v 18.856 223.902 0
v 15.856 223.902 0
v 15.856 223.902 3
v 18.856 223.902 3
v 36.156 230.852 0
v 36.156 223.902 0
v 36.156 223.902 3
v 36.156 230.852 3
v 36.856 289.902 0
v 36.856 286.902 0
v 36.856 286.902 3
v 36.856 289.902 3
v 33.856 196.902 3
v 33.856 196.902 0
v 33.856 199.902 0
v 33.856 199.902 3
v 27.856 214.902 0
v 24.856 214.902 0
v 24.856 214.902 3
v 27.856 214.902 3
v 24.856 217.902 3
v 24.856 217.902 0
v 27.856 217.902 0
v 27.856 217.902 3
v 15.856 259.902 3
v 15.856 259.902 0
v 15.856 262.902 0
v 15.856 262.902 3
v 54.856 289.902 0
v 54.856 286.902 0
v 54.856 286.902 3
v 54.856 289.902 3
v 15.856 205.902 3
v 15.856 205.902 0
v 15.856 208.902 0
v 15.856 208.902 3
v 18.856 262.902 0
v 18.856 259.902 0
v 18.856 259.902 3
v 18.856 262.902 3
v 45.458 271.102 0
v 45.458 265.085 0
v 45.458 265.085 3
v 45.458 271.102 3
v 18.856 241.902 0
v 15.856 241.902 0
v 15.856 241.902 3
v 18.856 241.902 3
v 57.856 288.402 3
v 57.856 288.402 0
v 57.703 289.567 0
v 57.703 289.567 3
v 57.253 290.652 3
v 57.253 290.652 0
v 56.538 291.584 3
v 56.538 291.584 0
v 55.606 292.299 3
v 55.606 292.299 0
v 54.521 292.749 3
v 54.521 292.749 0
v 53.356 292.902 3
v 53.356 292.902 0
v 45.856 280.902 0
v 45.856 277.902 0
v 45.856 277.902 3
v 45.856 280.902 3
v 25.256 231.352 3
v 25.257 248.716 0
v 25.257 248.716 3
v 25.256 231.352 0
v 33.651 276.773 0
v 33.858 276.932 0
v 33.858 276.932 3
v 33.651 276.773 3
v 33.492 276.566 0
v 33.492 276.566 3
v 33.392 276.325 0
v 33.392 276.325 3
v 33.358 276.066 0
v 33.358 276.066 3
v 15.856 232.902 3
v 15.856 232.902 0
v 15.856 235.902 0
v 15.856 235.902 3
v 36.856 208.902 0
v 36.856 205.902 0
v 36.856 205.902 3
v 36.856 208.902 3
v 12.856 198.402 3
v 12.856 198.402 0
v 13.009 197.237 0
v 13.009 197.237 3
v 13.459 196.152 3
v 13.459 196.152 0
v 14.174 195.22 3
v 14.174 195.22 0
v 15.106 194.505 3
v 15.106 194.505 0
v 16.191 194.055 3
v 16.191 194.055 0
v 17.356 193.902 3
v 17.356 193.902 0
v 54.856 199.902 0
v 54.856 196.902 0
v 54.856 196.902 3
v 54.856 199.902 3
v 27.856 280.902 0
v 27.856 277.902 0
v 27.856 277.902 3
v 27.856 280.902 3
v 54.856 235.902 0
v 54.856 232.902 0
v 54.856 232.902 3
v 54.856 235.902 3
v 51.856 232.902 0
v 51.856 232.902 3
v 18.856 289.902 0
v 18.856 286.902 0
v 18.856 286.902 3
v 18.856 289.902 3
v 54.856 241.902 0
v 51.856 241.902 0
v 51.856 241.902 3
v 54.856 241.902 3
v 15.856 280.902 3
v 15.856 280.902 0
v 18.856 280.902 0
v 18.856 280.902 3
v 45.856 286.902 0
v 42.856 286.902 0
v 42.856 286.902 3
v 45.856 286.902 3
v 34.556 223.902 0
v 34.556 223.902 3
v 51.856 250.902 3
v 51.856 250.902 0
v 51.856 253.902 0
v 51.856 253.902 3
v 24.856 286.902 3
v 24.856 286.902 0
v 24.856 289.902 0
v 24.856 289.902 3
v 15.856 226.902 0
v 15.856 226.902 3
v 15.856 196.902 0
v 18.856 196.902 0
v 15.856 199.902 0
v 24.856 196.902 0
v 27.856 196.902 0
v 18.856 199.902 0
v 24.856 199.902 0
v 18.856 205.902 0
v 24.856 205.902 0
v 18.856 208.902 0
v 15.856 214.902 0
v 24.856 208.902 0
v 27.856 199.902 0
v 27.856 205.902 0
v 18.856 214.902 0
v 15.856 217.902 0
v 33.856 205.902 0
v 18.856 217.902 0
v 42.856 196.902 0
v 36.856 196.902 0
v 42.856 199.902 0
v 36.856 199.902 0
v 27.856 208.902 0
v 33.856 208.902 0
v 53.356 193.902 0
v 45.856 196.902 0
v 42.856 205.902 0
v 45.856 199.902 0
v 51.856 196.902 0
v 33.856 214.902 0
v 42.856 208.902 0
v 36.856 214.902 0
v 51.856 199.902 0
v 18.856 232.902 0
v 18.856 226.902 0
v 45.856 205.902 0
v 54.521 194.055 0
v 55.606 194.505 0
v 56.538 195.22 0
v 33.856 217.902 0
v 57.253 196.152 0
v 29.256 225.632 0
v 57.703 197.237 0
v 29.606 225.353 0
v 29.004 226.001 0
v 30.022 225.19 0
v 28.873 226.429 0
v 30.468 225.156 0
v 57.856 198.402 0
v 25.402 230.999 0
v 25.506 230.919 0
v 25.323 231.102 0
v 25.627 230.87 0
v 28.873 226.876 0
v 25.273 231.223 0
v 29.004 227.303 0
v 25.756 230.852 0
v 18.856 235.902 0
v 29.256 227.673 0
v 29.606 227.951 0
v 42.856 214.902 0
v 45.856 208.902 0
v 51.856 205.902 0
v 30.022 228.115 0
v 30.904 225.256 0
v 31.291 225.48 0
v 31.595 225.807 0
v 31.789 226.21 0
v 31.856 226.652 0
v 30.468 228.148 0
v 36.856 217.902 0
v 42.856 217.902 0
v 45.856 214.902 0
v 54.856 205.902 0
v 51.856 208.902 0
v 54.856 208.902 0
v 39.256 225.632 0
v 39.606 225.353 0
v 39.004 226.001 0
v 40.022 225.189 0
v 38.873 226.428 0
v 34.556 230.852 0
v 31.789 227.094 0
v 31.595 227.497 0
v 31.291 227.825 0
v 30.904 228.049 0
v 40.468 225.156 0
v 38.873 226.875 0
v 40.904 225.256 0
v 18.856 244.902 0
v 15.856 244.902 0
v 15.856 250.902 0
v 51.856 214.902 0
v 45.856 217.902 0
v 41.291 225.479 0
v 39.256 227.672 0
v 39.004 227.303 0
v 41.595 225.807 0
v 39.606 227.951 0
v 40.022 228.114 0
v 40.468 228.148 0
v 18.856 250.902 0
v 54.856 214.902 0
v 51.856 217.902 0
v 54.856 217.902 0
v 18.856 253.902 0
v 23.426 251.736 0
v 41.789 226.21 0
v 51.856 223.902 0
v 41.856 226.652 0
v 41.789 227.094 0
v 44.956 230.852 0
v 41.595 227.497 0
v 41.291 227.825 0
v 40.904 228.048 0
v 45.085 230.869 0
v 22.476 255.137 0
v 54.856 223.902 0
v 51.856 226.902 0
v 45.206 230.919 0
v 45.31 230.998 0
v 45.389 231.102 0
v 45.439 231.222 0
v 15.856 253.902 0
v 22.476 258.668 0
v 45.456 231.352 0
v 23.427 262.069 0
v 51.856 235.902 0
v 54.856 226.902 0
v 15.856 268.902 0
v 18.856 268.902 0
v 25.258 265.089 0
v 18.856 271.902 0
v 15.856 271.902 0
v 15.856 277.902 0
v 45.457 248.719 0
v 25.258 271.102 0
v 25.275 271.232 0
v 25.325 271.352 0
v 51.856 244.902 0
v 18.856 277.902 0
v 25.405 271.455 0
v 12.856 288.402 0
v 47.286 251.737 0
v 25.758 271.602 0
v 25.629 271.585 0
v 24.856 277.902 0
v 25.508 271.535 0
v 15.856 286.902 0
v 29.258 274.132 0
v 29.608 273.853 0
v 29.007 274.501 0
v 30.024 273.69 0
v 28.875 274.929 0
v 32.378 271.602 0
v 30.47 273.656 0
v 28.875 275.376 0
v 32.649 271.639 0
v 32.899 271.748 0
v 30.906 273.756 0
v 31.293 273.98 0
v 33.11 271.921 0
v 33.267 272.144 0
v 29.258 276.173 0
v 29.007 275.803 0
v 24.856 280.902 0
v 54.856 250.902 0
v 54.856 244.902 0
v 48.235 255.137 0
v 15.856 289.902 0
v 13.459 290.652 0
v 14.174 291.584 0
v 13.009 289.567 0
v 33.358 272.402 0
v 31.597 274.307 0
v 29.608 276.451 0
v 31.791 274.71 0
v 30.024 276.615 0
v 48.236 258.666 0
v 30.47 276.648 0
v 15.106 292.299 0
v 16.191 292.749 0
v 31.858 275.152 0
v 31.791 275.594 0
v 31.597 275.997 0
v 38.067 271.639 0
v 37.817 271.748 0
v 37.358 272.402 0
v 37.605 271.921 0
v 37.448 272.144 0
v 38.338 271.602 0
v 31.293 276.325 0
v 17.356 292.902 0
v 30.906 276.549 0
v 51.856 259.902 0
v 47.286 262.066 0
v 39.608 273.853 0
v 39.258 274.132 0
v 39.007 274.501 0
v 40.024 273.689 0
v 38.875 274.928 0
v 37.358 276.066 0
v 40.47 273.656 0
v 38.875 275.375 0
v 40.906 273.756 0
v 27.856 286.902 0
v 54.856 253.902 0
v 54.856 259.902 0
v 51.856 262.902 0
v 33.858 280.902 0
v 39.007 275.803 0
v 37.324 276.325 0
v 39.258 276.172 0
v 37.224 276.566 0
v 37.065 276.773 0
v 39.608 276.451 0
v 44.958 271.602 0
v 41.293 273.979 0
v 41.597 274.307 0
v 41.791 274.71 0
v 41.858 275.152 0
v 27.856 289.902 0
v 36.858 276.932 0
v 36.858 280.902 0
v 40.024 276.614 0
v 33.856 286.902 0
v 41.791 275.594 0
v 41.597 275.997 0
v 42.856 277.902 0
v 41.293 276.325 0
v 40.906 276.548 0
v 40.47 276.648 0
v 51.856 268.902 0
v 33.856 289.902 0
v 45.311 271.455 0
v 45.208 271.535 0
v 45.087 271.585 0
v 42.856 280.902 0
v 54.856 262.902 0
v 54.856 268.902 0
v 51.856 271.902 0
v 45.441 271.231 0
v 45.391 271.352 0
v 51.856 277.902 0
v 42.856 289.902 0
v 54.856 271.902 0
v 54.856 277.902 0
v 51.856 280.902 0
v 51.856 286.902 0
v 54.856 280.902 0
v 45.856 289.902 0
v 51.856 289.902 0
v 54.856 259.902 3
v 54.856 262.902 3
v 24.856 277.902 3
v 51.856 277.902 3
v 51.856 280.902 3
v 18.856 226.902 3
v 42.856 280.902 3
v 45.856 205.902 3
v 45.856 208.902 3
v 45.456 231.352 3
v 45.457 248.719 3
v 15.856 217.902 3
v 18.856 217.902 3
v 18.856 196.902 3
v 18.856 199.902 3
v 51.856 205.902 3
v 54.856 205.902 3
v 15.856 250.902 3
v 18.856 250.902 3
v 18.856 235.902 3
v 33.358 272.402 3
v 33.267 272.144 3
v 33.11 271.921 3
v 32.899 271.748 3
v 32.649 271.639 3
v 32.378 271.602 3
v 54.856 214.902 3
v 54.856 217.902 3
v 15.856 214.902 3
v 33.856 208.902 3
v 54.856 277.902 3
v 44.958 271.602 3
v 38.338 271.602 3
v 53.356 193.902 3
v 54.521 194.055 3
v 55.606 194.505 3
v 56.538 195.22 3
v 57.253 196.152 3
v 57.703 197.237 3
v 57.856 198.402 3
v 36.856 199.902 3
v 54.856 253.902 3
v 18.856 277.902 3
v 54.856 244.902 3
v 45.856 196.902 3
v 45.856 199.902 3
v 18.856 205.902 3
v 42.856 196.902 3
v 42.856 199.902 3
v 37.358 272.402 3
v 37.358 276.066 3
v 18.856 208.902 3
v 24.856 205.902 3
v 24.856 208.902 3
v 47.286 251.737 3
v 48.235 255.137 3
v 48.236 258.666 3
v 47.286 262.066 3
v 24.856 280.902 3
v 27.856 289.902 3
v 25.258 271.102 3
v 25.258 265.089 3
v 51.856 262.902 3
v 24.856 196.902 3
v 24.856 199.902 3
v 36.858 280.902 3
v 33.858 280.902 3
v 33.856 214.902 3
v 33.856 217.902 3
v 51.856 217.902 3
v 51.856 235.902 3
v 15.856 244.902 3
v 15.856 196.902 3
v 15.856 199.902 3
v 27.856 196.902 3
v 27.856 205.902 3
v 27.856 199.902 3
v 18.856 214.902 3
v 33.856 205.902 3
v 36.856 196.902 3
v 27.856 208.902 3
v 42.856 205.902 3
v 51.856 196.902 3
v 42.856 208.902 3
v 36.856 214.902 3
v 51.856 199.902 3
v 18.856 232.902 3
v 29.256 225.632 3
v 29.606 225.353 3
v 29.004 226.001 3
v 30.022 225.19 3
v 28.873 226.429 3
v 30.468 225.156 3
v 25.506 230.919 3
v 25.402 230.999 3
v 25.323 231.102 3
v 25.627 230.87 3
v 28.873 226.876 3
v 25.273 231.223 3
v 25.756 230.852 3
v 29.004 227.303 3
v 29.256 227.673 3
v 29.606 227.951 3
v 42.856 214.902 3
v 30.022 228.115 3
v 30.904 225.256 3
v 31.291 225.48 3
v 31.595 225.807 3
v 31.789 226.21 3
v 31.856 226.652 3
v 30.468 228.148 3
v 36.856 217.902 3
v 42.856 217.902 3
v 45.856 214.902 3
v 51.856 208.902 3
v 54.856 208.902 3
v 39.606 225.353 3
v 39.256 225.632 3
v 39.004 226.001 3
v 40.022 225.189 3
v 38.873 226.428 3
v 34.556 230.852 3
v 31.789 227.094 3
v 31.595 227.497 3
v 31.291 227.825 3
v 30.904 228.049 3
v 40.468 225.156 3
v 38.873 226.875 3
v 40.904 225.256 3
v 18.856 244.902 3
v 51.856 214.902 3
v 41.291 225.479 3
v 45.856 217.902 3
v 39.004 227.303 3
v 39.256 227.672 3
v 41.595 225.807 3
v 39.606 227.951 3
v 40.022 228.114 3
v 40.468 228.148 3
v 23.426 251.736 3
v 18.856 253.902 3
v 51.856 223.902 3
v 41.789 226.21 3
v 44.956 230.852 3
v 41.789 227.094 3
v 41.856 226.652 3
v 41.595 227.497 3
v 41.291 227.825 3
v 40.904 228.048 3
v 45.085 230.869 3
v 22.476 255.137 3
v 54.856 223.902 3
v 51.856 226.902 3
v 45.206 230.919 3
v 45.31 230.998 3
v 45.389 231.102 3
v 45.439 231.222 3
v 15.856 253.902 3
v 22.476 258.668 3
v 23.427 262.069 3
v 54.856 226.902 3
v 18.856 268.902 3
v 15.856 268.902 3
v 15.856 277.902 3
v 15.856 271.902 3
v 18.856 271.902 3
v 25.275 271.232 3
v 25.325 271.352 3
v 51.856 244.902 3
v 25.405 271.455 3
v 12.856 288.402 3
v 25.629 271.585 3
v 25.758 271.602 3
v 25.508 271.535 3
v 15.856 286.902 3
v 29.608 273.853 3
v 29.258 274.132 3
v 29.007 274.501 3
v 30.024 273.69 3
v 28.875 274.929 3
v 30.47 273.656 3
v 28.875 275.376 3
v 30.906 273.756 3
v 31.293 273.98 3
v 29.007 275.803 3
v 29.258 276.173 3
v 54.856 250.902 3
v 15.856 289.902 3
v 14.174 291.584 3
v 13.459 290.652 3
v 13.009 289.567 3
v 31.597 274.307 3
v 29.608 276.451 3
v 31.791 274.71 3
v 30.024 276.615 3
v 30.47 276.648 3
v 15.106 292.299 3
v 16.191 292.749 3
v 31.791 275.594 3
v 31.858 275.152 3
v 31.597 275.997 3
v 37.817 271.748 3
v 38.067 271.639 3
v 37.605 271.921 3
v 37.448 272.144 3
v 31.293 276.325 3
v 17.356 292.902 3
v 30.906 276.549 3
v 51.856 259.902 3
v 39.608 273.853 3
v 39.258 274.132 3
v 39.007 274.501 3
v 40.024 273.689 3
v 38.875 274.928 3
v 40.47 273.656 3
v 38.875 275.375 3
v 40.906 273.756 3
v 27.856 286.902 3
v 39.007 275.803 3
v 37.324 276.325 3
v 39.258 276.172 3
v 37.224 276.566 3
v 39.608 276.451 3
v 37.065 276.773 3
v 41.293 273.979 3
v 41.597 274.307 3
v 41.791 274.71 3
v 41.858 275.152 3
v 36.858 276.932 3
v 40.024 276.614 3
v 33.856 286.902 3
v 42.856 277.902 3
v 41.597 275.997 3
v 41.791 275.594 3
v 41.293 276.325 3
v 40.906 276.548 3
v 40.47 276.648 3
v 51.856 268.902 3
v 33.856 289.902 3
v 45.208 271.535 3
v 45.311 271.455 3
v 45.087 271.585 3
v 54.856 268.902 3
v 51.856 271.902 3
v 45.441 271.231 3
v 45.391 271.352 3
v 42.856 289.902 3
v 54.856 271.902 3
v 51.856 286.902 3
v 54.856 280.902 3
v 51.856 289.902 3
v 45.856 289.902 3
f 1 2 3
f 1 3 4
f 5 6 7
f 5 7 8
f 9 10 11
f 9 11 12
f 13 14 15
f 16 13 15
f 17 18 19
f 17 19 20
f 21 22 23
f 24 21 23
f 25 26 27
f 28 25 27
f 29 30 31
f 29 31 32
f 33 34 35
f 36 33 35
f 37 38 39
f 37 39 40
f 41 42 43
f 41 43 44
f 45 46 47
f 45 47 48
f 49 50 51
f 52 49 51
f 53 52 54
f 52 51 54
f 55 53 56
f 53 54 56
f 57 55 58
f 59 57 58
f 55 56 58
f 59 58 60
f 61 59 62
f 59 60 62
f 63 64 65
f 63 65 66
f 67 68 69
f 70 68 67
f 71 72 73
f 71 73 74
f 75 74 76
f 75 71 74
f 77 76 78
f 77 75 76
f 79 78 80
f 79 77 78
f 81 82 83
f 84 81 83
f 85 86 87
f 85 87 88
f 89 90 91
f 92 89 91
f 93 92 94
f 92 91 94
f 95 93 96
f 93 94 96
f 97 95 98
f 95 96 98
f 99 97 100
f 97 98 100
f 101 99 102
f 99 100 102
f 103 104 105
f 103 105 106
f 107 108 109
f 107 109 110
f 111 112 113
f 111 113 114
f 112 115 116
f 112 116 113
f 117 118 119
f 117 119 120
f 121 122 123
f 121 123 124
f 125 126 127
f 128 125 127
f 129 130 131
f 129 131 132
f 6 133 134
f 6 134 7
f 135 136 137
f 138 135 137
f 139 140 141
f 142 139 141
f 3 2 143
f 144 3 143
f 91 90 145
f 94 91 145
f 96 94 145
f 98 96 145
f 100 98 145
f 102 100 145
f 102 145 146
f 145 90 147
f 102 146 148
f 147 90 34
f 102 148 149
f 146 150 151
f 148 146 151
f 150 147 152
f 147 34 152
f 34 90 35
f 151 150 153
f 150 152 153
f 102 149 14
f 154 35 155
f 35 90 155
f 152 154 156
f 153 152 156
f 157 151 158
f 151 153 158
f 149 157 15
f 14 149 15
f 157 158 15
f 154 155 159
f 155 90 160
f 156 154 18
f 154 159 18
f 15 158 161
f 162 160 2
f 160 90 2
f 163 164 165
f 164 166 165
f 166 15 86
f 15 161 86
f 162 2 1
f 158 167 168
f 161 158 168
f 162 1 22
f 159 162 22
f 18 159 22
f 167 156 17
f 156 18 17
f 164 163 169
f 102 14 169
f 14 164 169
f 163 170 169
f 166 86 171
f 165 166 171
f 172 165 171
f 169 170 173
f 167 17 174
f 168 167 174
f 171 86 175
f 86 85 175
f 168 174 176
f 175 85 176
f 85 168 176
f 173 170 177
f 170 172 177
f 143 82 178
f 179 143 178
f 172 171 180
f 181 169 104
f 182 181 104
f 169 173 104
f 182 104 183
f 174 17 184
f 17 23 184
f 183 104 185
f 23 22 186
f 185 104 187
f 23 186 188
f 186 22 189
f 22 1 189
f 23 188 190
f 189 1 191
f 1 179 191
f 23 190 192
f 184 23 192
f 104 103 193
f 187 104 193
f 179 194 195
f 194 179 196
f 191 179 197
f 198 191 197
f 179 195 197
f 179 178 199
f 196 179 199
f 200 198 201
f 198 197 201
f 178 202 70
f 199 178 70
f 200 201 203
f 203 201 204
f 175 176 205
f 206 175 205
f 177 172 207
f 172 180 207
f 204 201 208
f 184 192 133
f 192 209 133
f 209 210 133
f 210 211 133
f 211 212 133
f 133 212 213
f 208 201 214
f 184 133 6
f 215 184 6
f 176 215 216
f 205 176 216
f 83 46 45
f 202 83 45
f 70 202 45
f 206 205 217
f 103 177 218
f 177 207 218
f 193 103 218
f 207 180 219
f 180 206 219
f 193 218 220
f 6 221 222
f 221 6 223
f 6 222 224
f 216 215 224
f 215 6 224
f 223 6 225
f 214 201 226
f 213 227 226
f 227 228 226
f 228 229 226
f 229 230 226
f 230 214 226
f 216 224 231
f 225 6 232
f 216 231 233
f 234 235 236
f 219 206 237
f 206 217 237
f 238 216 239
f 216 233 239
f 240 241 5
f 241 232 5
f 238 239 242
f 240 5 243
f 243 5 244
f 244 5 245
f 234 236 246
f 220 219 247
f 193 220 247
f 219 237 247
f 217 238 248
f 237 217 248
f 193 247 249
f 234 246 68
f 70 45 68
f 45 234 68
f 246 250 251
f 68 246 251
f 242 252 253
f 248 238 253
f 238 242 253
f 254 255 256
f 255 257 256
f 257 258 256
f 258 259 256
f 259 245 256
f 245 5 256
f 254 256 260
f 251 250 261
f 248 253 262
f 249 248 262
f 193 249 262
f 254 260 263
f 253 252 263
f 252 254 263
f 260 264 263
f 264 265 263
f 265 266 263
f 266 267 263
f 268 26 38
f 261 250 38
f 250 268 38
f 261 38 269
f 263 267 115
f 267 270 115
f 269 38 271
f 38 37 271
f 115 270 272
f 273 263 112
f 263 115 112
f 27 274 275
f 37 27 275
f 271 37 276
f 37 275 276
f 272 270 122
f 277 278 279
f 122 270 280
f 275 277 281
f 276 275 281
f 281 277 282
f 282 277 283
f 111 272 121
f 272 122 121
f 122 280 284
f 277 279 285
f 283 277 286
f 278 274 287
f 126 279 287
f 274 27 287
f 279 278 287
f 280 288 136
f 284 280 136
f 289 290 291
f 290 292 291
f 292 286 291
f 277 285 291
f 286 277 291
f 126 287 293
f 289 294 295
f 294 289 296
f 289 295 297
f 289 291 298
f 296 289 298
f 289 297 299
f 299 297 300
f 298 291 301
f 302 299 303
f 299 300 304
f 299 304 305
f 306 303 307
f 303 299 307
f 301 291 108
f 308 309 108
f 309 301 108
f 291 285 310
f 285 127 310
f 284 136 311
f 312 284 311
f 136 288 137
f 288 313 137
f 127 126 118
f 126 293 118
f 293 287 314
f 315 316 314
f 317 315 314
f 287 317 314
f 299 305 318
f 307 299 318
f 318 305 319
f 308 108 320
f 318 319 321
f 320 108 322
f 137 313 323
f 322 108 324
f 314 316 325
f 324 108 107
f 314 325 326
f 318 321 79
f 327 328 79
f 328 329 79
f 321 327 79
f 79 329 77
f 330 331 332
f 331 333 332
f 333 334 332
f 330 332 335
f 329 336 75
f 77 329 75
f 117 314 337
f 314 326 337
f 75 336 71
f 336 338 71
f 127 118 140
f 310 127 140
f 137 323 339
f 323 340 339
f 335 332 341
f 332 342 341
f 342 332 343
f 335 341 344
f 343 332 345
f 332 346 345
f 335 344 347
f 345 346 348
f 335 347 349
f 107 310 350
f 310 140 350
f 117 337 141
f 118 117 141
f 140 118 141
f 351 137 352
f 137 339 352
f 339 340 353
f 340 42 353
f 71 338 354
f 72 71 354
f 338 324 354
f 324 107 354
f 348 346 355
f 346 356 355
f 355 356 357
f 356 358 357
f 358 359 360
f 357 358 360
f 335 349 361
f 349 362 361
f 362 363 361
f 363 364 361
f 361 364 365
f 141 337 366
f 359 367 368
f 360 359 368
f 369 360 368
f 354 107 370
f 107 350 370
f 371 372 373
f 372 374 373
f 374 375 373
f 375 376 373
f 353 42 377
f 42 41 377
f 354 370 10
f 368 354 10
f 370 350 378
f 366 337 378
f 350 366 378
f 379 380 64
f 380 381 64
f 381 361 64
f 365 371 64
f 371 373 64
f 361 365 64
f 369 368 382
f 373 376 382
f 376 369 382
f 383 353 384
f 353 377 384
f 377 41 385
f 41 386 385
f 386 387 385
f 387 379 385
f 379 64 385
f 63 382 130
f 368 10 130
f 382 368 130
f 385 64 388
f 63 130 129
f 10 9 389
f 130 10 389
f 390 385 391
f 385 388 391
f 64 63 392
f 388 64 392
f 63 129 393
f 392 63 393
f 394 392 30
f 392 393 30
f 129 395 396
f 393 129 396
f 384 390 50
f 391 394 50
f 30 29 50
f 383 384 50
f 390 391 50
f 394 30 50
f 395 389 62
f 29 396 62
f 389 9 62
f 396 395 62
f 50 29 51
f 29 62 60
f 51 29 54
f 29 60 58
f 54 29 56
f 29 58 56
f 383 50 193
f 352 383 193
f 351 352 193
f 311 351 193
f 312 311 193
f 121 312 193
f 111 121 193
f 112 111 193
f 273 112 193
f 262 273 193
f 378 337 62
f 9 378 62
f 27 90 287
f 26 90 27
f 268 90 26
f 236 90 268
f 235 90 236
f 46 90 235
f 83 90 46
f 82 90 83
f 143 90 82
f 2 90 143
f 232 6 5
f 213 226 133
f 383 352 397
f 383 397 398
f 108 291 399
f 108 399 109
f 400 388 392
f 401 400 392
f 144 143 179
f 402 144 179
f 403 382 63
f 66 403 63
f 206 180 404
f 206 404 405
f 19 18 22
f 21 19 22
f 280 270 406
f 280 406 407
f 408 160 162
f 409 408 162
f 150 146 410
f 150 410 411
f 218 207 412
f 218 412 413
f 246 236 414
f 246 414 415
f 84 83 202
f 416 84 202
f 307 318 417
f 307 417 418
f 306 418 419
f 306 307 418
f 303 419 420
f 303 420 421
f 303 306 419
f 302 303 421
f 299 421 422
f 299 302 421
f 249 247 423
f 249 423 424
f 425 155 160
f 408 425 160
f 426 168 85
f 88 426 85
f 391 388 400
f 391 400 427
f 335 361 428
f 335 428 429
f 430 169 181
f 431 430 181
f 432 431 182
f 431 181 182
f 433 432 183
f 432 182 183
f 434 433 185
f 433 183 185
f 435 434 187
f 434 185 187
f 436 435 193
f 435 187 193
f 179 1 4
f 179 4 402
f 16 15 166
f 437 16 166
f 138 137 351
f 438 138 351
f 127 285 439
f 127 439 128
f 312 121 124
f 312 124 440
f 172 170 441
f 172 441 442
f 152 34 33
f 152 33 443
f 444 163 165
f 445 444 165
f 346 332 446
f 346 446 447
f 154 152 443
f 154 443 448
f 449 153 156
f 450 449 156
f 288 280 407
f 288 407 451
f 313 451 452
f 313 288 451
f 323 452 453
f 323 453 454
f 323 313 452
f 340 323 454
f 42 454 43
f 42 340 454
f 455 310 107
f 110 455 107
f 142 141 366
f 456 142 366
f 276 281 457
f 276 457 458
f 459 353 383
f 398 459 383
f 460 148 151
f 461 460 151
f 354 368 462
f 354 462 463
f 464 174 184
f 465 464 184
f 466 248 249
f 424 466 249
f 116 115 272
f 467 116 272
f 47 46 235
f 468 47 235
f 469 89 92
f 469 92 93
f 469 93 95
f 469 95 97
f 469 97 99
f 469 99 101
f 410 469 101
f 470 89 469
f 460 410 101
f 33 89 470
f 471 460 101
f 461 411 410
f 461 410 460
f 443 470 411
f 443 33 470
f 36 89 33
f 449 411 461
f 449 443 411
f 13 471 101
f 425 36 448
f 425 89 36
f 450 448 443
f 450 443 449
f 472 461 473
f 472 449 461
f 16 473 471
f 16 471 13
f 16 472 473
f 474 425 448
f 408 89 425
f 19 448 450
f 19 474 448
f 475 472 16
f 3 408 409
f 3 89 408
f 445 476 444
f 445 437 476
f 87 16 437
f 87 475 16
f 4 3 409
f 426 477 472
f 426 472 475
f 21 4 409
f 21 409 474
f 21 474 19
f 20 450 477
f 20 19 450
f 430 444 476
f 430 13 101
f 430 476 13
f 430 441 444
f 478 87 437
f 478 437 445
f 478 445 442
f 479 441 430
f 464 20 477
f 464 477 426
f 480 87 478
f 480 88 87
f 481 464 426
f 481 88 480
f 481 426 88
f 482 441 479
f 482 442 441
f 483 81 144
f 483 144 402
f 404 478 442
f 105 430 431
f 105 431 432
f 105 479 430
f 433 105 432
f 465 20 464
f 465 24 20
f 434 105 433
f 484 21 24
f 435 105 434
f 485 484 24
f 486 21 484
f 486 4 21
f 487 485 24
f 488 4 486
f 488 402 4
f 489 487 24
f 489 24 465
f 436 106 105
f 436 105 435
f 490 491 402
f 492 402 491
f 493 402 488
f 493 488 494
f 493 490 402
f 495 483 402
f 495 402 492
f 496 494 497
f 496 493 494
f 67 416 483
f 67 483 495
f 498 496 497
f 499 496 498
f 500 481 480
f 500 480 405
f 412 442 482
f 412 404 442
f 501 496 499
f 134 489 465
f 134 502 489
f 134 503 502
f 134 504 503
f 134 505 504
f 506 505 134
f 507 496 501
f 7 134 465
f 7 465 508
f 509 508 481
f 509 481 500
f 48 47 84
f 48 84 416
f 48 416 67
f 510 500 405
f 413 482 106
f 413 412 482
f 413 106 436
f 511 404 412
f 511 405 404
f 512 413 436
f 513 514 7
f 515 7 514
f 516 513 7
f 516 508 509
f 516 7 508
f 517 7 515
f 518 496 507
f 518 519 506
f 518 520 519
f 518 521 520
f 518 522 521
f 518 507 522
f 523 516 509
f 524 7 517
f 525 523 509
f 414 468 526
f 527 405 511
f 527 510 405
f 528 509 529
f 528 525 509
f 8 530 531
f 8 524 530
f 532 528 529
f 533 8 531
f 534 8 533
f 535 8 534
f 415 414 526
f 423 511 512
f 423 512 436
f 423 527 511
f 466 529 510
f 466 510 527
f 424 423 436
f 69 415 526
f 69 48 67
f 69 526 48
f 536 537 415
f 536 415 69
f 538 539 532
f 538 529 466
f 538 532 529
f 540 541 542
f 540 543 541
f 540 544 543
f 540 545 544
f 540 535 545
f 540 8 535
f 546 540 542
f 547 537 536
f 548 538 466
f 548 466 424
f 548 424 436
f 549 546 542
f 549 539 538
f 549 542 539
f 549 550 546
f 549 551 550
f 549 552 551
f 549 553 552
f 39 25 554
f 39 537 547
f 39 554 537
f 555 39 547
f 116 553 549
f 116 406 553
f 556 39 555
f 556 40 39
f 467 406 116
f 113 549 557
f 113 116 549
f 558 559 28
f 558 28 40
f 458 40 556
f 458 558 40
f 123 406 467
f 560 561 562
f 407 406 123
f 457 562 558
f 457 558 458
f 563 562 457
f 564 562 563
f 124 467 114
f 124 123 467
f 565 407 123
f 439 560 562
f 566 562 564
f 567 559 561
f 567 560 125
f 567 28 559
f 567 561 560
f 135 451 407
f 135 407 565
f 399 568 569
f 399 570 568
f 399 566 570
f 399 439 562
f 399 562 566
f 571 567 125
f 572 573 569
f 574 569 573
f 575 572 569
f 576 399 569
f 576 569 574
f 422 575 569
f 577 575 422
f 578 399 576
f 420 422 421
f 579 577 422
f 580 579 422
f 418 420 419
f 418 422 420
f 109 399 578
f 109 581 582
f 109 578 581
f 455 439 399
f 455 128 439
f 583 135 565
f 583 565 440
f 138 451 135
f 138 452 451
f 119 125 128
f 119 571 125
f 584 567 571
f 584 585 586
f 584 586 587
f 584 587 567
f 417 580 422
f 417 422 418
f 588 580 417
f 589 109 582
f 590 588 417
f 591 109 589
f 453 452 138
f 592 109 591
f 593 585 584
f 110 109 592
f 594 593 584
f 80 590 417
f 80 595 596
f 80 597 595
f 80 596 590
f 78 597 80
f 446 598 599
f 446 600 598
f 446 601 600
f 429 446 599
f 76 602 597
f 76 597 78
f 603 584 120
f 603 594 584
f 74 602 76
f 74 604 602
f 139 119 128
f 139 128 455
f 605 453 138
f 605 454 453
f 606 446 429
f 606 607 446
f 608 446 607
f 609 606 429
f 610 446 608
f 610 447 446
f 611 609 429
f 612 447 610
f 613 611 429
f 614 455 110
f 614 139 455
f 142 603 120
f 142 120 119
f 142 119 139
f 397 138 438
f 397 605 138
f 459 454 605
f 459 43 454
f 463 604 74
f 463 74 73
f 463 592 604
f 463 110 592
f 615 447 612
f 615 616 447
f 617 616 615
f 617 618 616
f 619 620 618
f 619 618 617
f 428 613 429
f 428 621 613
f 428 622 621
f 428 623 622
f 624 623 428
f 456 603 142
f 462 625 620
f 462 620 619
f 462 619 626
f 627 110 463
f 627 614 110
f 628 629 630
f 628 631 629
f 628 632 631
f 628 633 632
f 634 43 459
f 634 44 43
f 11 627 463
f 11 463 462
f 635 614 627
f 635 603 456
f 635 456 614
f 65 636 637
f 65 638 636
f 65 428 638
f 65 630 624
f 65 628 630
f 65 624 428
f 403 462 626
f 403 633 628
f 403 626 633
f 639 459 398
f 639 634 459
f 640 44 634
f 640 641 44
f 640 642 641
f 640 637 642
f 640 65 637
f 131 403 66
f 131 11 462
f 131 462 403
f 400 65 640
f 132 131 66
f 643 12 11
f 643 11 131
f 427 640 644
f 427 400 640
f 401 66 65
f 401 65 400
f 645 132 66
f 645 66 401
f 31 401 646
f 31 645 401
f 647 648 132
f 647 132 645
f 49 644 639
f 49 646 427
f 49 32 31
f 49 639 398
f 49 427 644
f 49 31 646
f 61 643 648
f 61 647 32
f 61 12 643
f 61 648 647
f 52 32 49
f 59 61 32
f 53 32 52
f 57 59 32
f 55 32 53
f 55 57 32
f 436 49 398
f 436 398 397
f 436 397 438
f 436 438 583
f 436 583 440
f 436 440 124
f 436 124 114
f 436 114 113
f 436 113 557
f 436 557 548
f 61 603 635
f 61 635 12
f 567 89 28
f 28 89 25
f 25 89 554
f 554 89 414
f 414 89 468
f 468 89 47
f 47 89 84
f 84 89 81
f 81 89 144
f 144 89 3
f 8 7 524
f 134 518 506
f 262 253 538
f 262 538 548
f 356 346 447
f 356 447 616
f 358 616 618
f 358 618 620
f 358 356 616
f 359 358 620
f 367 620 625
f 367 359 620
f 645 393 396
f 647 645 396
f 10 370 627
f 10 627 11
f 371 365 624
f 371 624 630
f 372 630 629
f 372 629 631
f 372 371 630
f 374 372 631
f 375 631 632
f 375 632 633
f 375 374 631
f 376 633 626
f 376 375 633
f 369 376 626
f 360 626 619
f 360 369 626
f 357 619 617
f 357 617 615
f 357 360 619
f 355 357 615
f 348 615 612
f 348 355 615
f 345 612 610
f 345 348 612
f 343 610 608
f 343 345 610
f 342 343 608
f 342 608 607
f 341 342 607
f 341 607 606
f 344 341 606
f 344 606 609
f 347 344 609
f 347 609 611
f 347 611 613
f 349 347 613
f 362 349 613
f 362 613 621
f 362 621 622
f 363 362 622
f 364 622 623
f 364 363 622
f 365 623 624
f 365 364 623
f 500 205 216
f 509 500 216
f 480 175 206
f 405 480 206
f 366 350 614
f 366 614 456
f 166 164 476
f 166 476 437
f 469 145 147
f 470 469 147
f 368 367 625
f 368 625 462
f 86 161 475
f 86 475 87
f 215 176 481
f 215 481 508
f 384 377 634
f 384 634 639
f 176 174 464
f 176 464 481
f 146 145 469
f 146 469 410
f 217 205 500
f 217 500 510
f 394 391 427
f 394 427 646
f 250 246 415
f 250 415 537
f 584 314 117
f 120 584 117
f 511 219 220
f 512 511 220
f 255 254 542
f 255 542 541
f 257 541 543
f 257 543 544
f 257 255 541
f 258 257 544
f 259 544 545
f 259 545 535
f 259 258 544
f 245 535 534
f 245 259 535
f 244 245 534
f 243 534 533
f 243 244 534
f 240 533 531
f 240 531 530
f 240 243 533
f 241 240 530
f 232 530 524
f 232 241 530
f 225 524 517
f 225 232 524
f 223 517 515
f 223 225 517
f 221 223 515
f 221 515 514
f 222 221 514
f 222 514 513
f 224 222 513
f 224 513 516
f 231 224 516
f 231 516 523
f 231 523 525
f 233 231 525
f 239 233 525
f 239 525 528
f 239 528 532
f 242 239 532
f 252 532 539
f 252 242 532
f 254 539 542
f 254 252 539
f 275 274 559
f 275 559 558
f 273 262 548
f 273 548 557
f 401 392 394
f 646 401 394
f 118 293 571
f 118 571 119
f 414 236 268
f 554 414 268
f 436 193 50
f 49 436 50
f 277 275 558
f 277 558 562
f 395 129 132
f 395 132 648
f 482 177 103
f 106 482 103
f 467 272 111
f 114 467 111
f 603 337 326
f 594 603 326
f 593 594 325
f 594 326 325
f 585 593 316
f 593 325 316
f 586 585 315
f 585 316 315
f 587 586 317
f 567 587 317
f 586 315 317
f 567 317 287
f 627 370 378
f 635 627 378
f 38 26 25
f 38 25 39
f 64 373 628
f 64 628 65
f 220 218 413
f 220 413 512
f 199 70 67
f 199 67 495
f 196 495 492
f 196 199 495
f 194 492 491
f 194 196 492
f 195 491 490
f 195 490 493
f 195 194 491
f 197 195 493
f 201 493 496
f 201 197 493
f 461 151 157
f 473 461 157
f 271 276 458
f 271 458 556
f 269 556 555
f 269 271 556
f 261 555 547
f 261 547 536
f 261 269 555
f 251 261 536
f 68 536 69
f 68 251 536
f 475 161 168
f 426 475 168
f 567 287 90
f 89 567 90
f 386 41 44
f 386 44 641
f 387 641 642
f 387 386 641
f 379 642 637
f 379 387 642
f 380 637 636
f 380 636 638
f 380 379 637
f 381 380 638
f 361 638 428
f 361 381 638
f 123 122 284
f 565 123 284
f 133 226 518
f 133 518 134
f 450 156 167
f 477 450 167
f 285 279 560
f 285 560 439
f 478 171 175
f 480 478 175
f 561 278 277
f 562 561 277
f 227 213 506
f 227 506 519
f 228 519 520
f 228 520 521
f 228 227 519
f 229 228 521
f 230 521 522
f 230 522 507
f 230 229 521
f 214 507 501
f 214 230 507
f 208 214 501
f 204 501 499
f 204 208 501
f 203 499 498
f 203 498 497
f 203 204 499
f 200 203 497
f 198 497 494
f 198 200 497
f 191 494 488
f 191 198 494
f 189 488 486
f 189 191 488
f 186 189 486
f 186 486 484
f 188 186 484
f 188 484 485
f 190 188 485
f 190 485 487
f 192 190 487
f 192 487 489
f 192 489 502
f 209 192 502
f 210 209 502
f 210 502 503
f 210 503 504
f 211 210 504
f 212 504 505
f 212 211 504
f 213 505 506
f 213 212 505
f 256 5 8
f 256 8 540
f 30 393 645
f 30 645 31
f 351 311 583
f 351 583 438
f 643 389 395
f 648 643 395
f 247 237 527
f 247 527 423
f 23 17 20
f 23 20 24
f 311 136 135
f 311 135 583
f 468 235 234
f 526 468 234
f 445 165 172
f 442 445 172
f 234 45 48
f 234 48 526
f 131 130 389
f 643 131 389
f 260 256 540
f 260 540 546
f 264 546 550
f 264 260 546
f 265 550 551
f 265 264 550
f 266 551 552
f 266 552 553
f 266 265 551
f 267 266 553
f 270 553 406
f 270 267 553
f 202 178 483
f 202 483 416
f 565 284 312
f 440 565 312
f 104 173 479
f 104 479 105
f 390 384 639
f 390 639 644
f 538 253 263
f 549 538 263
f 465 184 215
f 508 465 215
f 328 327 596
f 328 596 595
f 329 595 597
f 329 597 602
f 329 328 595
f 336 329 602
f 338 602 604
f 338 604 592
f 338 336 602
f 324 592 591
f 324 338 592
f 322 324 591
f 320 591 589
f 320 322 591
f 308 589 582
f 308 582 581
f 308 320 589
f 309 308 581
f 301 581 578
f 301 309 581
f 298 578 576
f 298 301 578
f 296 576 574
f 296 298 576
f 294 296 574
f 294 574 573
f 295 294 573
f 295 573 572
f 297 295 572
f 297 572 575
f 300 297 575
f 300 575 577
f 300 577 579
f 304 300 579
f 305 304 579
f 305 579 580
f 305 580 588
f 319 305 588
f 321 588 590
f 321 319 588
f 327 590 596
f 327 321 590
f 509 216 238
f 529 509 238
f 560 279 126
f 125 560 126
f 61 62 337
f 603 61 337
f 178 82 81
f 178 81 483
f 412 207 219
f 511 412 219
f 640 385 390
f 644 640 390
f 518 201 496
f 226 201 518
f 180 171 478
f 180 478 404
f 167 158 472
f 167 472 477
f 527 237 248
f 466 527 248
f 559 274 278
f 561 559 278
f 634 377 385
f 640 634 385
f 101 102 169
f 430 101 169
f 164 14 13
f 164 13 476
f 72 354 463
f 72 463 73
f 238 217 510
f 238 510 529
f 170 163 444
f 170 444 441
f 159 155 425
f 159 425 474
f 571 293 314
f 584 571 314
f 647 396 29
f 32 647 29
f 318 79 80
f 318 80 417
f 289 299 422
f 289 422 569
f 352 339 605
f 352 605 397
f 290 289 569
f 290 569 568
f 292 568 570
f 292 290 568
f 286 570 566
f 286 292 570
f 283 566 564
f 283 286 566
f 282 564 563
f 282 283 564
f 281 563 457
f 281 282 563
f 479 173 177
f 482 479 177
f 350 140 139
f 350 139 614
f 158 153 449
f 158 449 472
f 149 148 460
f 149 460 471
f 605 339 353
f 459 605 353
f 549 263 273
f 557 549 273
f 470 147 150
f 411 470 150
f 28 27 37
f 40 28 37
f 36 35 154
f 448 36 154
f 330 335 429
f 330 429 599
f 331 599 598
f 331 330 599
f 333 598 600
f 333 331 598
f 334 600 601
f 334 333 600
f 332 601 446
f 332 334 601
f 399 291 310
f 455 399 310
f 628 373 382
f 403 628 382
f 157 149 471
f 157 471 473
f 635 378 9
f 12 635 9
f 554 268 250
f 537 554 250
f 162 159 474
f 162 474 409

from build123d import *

# Parameters (mm, degrees)
MODEL_R                 = 1.5
MODEL_W                 = 3
MODEL_H                 = 3
SALIENTE_EXTRUIR1_DEPTH = 3


with BuildPart() as part:
    # Model → Saliente-Extruir1 (new body)
    with BuildSketch(Plane.XY):
        with BuildLine():
            Line((17.356035274, 193.902048875), (53.356035274, 193.902048875))
            ThreePointArc((53.356035274, 193.902048875), (56.53801579, 195.22006836), (57.856035274, 198.402048875))
            Line((57.856035274, 198.402048875), (57.856035274, 288.402048875))
            ThreePointArc((57.856035274, 288.402048875), (56.53801579, 291.58402939), (53.356035274, 292.902048875))
            Line((53.356035274, 292.902048875), (17.356035274, 292.902048875))
            ThreePointArc((17.356035274, 292.902048875), (14.174054759, 291.58402939), (12.856035274, 288.402048875))
            Line((12.856035274, 288.402048875), (12.856035274, 198.402048875))
            ThreePointArc((12.856035274, 198.402048875), (14.174054759, 195.22006836), (17.356035274, 193.902048875))
        make_face()
        with Locations((40.355847758, 226.651825621)):
            Circle(MODEL_R, mode=Mode.SUBTRACT)
        with Locations((30.355847768, 226.652272077)):
            Circle(MODEL_R, mode=Mode.SUBTRACT)
        with Locations((40.358013069, 275.151825573)):
            Circle(MODEL_R, mode=Mode.SUBTRACT)
        with Locations((30.35801308, 275.152272029)):
            Circle(MODEL_R, mode=Mode.SUBTRACT)
        with Locations((53.356035274, 288.402048875)):
            Rectangle(MODEL_W, MODEL_H, mode=Mode.SUBTRACT)
        with Locations((53.356035274, 279.402048875)):
            Rectangle(MODEL_W, MODEL_H, mode=Mode.SUBTRACT)
        with Locations((53.356035274, 270.402048875)):
            Rectangle(MODEL_W, MODEL_H, mode=Mode.SUBTRACT)
        with Locations((53.356035274, 261.402048875)):
            Rectangle(MODEL_W, MODEL_H, mode=Mode.SUBTRACT)
        with Locations((53.356035274, 252.402048875)):
            Rectangle(MODEL_W, MODEL_H, mode=Mode.SUBTRACT)
        with Locations((53.356035274, 243.402048875)):
            Rectangle(MODEL_W, MODEL_H, mode=Mode.SUBTRACT)
        with Locations((53.356035274, 234.402048875)):
            Rectangle(MODEL_W, MODEL_H, mode=Mode.SUBTRACT)
        with Locations((53.356035274, 225.402048875)):
            Rectangle(MODEL_W, MODEL_H, mode=Mode.SUBTRACT)
        with Locations((53.356035274, 216.402048875)):
            Rectangle(MODEL_W, MODEL_H, mode=Mode.SUBTRACT)
        with Locations((53.356035274, 207.402048875)):
            Rectangle(MODEL_W, MODEL_H, mode=Mode.SUBTRACT)
        with Locations((53.356035274, 198.402048875)):
            Rectangle(MODEL_W, MODEL_H, mode=Mode.SUBTRACT)
        with Locations((17.356035274, 288.402048875)):
            Rectangle(MODEL_W, MODEL_H, mode=Mode.SUBTRACT)
        with Locations((17.356035274, 279.402048875)):
            Rectangle(MODEL_W, MODEL_H, mode=Mode.SUBTRACT)
        with Locations((17.356035274, 270.402048875)):
            Rectangle(MODEL_W, MODEL_H, mode=Mode.SUBTRACT)
        with Locations((17.356035274, 261.402048875)):
            Rectangle(MODEL_W, MODEL_H, mode=Mode.SUBTRACT)
        with Locations((17.356035274, 252.402048875)):
            Rectangle(MODEL_W, MODEL_H, mode=Mode.SUBTRACT)
        with Locations((17.356035274, 243.402048875)):
            Rectangle(MODEL_W, MODEL_H, mode=Mode.SUBTRACT)
        with Locations((17.356035274, 234.402048875)):
            Rectangle(MODEL_W, MODEL_H, mode=Mode.SUBTRACT)
        with Locations((17.356035274, 225.402048875)):
            Rectangle(MODEL_W, MODEL_H, mode=Mode.SUBTRACT)
        with Locations((17.356035274, 216.402048875)):
            Rectangle(MODEL_W, MODEL_H, mode=Mode.SUBTRACT)
        with Locations((17.356035274, 207.402048875)):
            Rectangle(MODEL_W, MODEL_H, mode=Mode.SUBTRACT)
        with Locations((17.356035274, 198.402048875)):
            Rectangle(MODEL_W, MODEL_H, mode=Mode.SUBTRACT)
        with Locations((44.356035274, 198.402048875)):
            Rectangle(MODEL_W, MODEL_H, mode=Mode.SUBTRACT)
        with Locations((26.356035274, 198.402048875)):
            Rectangle(MODEL_W, MODEL_H, mode=Mode.SUBTRACT)
        with Locations((35.356035274, 198.402048875)):
            Rectangle(MODEL_W, MODEL_H, mode=Mode.SUBTRACT)
        with Locations((44.356035274, 216.402048875)):
            Rectangle(MODEL_W, MODEL_H, mode=Mode.SUBTRACT)
        with Locations((26.356035274, 216.402048875)):
            Rectangle(MODEL_W, MODEL_H, mode=Mode.SUBTRACT)
        with Locations((35.356035274, 216.402048875)):
            Rectangle(MODEL_W, MODEL_H, mode=Mode.SUBTRACT)
        with Locations((44.356035274, 207.402048875)):
            Rectangle(MODEL_W, MODEL_H, mode=Mode.SUBTRACT)
        with Locations((26.356035274, 207.402048875)):
            Rectangle(MODEL_W, MODEL_H, mode=Mode.SUBTRACT)
        with Locations((35.356035274, 207.402048875)):
            Rectangle(MODEL_W, MODEL_H, mode=Mode.SUBTRACT)
        with Locations((44.356035274, 288.402048875)):
            Rectangle(MODEL_W, MODEL_H, mode=Mode.SUBTRACT)
        with Locations((26.356035274, 288.402048875)):
            Rectangle(MODEL_W, MODEL_H, mode=Mode.SUBTRACT)
        with Locations((35.356035274, 288.402048875)):
            Rectangle(MODEL_W, MODEL_H, mode=Mode.SUBTRACT)
        with Locations((44.356035274, 279.402048875)):
            Rectangle(MODEL_W, MODEL_H, mode=Mode.SUBTRACT)
        with Locations((26.356035274, 279.402048875)):
            Rectangle(MODEL_W, MODEL_H, mode=Mode.SUBTRACT)
        with BuildLine():
            Line((33.857854573, 280.901620206), (33.857854573, 276.931747225))
            ThreePointArc((33.857854573, 276.931747225), (33.491829169, 276.565721821), (33.357854573, 276.065721821))
            Line((33.357854573, 276.065721821), (33.357854573, 272.401620206))
            ThreePointArc((33.357854573, 272.401620206), (33.010514208, 271.827023537), (32.378058676, 271.601620206))
            Line((32.378058676, 271.601620206), (25.757854573, 271.601620206))
            ThreePointArc((25.757854573, 271.601620206), (25.404597365, 271.455492569), (25.25783227, 271.102499725))
            Line((25.25783227, 271.102499725), (25.25756379, 265.088924432))
            ThreePointArc((25.25756379, 265.088924432), (22.355834382, 256.902629272), (25.256832814, 248.716075046))
            Line((25.256832814, 248.716075046), (25.256057607, 231.352499765))
            ThreePointArc((25.256057607, 231.352499765), (25.402488432, 230.998939836), (25.756035284, 230.852477443))
            Line((25.756035284, 230.852477443), (34.556035275, 230.852084561))
            Line((34.556035275, 230.852084561), (34.555724988, 223.902084568))
            Line((34.555724988, 223.902084568), (36.155724986, 223.902013135))
            Line((36.155724986, 223.902013135), (36.156035273, 230.852013128))
            Line((36.156035273, 230.852013128), (44.956035265, 230.851620247))
            ThreePointArc((44.956035265, 230.851620247), (45.309595193, 230.998051072), (45.456057587, 231.351597924))
            Line((45.456057587, 231.351597924), (45.456832945, 248.718539377))
            ThreePointArc((45.456832945, 248.718539377), (48.355834356, 256.901468487), (45.45756362, 265.084656419))
            Line((45.45756362, 265.084656419), (45.45783225, 271.101597884))
            ThreePointArc((45.45783225, 271.101597884), (45.311401425, 271.455157812), (44.957854573, 271.601620206))
            Line((44.957854573, 271.601620206), (38.33765047, 271.601620206))
            ThreePointArc((38.33765047, 271.601620206), (37.705194938, 271.827023537), (37.357854573, 272.401620206))
            Line((37.357854573, 272.401620206), (37.357854573, 276.065721821))
            ThreePointArc((37.357854573, 276.065721821), (37.223879977, 276.565721821), (36.857854573, 276.931747225))
            Line((36.857854573, 276.931747225), (36.857854573, 280.901620206))
            Line((36.857854573, 280.901620206), (33.857854573, 280.901620206))
        make_face(mode=Mode.SUBTRACT)
    extrude(amount=SALIENTE_EXTRUIR1_DEPTH)


solid = part.part
